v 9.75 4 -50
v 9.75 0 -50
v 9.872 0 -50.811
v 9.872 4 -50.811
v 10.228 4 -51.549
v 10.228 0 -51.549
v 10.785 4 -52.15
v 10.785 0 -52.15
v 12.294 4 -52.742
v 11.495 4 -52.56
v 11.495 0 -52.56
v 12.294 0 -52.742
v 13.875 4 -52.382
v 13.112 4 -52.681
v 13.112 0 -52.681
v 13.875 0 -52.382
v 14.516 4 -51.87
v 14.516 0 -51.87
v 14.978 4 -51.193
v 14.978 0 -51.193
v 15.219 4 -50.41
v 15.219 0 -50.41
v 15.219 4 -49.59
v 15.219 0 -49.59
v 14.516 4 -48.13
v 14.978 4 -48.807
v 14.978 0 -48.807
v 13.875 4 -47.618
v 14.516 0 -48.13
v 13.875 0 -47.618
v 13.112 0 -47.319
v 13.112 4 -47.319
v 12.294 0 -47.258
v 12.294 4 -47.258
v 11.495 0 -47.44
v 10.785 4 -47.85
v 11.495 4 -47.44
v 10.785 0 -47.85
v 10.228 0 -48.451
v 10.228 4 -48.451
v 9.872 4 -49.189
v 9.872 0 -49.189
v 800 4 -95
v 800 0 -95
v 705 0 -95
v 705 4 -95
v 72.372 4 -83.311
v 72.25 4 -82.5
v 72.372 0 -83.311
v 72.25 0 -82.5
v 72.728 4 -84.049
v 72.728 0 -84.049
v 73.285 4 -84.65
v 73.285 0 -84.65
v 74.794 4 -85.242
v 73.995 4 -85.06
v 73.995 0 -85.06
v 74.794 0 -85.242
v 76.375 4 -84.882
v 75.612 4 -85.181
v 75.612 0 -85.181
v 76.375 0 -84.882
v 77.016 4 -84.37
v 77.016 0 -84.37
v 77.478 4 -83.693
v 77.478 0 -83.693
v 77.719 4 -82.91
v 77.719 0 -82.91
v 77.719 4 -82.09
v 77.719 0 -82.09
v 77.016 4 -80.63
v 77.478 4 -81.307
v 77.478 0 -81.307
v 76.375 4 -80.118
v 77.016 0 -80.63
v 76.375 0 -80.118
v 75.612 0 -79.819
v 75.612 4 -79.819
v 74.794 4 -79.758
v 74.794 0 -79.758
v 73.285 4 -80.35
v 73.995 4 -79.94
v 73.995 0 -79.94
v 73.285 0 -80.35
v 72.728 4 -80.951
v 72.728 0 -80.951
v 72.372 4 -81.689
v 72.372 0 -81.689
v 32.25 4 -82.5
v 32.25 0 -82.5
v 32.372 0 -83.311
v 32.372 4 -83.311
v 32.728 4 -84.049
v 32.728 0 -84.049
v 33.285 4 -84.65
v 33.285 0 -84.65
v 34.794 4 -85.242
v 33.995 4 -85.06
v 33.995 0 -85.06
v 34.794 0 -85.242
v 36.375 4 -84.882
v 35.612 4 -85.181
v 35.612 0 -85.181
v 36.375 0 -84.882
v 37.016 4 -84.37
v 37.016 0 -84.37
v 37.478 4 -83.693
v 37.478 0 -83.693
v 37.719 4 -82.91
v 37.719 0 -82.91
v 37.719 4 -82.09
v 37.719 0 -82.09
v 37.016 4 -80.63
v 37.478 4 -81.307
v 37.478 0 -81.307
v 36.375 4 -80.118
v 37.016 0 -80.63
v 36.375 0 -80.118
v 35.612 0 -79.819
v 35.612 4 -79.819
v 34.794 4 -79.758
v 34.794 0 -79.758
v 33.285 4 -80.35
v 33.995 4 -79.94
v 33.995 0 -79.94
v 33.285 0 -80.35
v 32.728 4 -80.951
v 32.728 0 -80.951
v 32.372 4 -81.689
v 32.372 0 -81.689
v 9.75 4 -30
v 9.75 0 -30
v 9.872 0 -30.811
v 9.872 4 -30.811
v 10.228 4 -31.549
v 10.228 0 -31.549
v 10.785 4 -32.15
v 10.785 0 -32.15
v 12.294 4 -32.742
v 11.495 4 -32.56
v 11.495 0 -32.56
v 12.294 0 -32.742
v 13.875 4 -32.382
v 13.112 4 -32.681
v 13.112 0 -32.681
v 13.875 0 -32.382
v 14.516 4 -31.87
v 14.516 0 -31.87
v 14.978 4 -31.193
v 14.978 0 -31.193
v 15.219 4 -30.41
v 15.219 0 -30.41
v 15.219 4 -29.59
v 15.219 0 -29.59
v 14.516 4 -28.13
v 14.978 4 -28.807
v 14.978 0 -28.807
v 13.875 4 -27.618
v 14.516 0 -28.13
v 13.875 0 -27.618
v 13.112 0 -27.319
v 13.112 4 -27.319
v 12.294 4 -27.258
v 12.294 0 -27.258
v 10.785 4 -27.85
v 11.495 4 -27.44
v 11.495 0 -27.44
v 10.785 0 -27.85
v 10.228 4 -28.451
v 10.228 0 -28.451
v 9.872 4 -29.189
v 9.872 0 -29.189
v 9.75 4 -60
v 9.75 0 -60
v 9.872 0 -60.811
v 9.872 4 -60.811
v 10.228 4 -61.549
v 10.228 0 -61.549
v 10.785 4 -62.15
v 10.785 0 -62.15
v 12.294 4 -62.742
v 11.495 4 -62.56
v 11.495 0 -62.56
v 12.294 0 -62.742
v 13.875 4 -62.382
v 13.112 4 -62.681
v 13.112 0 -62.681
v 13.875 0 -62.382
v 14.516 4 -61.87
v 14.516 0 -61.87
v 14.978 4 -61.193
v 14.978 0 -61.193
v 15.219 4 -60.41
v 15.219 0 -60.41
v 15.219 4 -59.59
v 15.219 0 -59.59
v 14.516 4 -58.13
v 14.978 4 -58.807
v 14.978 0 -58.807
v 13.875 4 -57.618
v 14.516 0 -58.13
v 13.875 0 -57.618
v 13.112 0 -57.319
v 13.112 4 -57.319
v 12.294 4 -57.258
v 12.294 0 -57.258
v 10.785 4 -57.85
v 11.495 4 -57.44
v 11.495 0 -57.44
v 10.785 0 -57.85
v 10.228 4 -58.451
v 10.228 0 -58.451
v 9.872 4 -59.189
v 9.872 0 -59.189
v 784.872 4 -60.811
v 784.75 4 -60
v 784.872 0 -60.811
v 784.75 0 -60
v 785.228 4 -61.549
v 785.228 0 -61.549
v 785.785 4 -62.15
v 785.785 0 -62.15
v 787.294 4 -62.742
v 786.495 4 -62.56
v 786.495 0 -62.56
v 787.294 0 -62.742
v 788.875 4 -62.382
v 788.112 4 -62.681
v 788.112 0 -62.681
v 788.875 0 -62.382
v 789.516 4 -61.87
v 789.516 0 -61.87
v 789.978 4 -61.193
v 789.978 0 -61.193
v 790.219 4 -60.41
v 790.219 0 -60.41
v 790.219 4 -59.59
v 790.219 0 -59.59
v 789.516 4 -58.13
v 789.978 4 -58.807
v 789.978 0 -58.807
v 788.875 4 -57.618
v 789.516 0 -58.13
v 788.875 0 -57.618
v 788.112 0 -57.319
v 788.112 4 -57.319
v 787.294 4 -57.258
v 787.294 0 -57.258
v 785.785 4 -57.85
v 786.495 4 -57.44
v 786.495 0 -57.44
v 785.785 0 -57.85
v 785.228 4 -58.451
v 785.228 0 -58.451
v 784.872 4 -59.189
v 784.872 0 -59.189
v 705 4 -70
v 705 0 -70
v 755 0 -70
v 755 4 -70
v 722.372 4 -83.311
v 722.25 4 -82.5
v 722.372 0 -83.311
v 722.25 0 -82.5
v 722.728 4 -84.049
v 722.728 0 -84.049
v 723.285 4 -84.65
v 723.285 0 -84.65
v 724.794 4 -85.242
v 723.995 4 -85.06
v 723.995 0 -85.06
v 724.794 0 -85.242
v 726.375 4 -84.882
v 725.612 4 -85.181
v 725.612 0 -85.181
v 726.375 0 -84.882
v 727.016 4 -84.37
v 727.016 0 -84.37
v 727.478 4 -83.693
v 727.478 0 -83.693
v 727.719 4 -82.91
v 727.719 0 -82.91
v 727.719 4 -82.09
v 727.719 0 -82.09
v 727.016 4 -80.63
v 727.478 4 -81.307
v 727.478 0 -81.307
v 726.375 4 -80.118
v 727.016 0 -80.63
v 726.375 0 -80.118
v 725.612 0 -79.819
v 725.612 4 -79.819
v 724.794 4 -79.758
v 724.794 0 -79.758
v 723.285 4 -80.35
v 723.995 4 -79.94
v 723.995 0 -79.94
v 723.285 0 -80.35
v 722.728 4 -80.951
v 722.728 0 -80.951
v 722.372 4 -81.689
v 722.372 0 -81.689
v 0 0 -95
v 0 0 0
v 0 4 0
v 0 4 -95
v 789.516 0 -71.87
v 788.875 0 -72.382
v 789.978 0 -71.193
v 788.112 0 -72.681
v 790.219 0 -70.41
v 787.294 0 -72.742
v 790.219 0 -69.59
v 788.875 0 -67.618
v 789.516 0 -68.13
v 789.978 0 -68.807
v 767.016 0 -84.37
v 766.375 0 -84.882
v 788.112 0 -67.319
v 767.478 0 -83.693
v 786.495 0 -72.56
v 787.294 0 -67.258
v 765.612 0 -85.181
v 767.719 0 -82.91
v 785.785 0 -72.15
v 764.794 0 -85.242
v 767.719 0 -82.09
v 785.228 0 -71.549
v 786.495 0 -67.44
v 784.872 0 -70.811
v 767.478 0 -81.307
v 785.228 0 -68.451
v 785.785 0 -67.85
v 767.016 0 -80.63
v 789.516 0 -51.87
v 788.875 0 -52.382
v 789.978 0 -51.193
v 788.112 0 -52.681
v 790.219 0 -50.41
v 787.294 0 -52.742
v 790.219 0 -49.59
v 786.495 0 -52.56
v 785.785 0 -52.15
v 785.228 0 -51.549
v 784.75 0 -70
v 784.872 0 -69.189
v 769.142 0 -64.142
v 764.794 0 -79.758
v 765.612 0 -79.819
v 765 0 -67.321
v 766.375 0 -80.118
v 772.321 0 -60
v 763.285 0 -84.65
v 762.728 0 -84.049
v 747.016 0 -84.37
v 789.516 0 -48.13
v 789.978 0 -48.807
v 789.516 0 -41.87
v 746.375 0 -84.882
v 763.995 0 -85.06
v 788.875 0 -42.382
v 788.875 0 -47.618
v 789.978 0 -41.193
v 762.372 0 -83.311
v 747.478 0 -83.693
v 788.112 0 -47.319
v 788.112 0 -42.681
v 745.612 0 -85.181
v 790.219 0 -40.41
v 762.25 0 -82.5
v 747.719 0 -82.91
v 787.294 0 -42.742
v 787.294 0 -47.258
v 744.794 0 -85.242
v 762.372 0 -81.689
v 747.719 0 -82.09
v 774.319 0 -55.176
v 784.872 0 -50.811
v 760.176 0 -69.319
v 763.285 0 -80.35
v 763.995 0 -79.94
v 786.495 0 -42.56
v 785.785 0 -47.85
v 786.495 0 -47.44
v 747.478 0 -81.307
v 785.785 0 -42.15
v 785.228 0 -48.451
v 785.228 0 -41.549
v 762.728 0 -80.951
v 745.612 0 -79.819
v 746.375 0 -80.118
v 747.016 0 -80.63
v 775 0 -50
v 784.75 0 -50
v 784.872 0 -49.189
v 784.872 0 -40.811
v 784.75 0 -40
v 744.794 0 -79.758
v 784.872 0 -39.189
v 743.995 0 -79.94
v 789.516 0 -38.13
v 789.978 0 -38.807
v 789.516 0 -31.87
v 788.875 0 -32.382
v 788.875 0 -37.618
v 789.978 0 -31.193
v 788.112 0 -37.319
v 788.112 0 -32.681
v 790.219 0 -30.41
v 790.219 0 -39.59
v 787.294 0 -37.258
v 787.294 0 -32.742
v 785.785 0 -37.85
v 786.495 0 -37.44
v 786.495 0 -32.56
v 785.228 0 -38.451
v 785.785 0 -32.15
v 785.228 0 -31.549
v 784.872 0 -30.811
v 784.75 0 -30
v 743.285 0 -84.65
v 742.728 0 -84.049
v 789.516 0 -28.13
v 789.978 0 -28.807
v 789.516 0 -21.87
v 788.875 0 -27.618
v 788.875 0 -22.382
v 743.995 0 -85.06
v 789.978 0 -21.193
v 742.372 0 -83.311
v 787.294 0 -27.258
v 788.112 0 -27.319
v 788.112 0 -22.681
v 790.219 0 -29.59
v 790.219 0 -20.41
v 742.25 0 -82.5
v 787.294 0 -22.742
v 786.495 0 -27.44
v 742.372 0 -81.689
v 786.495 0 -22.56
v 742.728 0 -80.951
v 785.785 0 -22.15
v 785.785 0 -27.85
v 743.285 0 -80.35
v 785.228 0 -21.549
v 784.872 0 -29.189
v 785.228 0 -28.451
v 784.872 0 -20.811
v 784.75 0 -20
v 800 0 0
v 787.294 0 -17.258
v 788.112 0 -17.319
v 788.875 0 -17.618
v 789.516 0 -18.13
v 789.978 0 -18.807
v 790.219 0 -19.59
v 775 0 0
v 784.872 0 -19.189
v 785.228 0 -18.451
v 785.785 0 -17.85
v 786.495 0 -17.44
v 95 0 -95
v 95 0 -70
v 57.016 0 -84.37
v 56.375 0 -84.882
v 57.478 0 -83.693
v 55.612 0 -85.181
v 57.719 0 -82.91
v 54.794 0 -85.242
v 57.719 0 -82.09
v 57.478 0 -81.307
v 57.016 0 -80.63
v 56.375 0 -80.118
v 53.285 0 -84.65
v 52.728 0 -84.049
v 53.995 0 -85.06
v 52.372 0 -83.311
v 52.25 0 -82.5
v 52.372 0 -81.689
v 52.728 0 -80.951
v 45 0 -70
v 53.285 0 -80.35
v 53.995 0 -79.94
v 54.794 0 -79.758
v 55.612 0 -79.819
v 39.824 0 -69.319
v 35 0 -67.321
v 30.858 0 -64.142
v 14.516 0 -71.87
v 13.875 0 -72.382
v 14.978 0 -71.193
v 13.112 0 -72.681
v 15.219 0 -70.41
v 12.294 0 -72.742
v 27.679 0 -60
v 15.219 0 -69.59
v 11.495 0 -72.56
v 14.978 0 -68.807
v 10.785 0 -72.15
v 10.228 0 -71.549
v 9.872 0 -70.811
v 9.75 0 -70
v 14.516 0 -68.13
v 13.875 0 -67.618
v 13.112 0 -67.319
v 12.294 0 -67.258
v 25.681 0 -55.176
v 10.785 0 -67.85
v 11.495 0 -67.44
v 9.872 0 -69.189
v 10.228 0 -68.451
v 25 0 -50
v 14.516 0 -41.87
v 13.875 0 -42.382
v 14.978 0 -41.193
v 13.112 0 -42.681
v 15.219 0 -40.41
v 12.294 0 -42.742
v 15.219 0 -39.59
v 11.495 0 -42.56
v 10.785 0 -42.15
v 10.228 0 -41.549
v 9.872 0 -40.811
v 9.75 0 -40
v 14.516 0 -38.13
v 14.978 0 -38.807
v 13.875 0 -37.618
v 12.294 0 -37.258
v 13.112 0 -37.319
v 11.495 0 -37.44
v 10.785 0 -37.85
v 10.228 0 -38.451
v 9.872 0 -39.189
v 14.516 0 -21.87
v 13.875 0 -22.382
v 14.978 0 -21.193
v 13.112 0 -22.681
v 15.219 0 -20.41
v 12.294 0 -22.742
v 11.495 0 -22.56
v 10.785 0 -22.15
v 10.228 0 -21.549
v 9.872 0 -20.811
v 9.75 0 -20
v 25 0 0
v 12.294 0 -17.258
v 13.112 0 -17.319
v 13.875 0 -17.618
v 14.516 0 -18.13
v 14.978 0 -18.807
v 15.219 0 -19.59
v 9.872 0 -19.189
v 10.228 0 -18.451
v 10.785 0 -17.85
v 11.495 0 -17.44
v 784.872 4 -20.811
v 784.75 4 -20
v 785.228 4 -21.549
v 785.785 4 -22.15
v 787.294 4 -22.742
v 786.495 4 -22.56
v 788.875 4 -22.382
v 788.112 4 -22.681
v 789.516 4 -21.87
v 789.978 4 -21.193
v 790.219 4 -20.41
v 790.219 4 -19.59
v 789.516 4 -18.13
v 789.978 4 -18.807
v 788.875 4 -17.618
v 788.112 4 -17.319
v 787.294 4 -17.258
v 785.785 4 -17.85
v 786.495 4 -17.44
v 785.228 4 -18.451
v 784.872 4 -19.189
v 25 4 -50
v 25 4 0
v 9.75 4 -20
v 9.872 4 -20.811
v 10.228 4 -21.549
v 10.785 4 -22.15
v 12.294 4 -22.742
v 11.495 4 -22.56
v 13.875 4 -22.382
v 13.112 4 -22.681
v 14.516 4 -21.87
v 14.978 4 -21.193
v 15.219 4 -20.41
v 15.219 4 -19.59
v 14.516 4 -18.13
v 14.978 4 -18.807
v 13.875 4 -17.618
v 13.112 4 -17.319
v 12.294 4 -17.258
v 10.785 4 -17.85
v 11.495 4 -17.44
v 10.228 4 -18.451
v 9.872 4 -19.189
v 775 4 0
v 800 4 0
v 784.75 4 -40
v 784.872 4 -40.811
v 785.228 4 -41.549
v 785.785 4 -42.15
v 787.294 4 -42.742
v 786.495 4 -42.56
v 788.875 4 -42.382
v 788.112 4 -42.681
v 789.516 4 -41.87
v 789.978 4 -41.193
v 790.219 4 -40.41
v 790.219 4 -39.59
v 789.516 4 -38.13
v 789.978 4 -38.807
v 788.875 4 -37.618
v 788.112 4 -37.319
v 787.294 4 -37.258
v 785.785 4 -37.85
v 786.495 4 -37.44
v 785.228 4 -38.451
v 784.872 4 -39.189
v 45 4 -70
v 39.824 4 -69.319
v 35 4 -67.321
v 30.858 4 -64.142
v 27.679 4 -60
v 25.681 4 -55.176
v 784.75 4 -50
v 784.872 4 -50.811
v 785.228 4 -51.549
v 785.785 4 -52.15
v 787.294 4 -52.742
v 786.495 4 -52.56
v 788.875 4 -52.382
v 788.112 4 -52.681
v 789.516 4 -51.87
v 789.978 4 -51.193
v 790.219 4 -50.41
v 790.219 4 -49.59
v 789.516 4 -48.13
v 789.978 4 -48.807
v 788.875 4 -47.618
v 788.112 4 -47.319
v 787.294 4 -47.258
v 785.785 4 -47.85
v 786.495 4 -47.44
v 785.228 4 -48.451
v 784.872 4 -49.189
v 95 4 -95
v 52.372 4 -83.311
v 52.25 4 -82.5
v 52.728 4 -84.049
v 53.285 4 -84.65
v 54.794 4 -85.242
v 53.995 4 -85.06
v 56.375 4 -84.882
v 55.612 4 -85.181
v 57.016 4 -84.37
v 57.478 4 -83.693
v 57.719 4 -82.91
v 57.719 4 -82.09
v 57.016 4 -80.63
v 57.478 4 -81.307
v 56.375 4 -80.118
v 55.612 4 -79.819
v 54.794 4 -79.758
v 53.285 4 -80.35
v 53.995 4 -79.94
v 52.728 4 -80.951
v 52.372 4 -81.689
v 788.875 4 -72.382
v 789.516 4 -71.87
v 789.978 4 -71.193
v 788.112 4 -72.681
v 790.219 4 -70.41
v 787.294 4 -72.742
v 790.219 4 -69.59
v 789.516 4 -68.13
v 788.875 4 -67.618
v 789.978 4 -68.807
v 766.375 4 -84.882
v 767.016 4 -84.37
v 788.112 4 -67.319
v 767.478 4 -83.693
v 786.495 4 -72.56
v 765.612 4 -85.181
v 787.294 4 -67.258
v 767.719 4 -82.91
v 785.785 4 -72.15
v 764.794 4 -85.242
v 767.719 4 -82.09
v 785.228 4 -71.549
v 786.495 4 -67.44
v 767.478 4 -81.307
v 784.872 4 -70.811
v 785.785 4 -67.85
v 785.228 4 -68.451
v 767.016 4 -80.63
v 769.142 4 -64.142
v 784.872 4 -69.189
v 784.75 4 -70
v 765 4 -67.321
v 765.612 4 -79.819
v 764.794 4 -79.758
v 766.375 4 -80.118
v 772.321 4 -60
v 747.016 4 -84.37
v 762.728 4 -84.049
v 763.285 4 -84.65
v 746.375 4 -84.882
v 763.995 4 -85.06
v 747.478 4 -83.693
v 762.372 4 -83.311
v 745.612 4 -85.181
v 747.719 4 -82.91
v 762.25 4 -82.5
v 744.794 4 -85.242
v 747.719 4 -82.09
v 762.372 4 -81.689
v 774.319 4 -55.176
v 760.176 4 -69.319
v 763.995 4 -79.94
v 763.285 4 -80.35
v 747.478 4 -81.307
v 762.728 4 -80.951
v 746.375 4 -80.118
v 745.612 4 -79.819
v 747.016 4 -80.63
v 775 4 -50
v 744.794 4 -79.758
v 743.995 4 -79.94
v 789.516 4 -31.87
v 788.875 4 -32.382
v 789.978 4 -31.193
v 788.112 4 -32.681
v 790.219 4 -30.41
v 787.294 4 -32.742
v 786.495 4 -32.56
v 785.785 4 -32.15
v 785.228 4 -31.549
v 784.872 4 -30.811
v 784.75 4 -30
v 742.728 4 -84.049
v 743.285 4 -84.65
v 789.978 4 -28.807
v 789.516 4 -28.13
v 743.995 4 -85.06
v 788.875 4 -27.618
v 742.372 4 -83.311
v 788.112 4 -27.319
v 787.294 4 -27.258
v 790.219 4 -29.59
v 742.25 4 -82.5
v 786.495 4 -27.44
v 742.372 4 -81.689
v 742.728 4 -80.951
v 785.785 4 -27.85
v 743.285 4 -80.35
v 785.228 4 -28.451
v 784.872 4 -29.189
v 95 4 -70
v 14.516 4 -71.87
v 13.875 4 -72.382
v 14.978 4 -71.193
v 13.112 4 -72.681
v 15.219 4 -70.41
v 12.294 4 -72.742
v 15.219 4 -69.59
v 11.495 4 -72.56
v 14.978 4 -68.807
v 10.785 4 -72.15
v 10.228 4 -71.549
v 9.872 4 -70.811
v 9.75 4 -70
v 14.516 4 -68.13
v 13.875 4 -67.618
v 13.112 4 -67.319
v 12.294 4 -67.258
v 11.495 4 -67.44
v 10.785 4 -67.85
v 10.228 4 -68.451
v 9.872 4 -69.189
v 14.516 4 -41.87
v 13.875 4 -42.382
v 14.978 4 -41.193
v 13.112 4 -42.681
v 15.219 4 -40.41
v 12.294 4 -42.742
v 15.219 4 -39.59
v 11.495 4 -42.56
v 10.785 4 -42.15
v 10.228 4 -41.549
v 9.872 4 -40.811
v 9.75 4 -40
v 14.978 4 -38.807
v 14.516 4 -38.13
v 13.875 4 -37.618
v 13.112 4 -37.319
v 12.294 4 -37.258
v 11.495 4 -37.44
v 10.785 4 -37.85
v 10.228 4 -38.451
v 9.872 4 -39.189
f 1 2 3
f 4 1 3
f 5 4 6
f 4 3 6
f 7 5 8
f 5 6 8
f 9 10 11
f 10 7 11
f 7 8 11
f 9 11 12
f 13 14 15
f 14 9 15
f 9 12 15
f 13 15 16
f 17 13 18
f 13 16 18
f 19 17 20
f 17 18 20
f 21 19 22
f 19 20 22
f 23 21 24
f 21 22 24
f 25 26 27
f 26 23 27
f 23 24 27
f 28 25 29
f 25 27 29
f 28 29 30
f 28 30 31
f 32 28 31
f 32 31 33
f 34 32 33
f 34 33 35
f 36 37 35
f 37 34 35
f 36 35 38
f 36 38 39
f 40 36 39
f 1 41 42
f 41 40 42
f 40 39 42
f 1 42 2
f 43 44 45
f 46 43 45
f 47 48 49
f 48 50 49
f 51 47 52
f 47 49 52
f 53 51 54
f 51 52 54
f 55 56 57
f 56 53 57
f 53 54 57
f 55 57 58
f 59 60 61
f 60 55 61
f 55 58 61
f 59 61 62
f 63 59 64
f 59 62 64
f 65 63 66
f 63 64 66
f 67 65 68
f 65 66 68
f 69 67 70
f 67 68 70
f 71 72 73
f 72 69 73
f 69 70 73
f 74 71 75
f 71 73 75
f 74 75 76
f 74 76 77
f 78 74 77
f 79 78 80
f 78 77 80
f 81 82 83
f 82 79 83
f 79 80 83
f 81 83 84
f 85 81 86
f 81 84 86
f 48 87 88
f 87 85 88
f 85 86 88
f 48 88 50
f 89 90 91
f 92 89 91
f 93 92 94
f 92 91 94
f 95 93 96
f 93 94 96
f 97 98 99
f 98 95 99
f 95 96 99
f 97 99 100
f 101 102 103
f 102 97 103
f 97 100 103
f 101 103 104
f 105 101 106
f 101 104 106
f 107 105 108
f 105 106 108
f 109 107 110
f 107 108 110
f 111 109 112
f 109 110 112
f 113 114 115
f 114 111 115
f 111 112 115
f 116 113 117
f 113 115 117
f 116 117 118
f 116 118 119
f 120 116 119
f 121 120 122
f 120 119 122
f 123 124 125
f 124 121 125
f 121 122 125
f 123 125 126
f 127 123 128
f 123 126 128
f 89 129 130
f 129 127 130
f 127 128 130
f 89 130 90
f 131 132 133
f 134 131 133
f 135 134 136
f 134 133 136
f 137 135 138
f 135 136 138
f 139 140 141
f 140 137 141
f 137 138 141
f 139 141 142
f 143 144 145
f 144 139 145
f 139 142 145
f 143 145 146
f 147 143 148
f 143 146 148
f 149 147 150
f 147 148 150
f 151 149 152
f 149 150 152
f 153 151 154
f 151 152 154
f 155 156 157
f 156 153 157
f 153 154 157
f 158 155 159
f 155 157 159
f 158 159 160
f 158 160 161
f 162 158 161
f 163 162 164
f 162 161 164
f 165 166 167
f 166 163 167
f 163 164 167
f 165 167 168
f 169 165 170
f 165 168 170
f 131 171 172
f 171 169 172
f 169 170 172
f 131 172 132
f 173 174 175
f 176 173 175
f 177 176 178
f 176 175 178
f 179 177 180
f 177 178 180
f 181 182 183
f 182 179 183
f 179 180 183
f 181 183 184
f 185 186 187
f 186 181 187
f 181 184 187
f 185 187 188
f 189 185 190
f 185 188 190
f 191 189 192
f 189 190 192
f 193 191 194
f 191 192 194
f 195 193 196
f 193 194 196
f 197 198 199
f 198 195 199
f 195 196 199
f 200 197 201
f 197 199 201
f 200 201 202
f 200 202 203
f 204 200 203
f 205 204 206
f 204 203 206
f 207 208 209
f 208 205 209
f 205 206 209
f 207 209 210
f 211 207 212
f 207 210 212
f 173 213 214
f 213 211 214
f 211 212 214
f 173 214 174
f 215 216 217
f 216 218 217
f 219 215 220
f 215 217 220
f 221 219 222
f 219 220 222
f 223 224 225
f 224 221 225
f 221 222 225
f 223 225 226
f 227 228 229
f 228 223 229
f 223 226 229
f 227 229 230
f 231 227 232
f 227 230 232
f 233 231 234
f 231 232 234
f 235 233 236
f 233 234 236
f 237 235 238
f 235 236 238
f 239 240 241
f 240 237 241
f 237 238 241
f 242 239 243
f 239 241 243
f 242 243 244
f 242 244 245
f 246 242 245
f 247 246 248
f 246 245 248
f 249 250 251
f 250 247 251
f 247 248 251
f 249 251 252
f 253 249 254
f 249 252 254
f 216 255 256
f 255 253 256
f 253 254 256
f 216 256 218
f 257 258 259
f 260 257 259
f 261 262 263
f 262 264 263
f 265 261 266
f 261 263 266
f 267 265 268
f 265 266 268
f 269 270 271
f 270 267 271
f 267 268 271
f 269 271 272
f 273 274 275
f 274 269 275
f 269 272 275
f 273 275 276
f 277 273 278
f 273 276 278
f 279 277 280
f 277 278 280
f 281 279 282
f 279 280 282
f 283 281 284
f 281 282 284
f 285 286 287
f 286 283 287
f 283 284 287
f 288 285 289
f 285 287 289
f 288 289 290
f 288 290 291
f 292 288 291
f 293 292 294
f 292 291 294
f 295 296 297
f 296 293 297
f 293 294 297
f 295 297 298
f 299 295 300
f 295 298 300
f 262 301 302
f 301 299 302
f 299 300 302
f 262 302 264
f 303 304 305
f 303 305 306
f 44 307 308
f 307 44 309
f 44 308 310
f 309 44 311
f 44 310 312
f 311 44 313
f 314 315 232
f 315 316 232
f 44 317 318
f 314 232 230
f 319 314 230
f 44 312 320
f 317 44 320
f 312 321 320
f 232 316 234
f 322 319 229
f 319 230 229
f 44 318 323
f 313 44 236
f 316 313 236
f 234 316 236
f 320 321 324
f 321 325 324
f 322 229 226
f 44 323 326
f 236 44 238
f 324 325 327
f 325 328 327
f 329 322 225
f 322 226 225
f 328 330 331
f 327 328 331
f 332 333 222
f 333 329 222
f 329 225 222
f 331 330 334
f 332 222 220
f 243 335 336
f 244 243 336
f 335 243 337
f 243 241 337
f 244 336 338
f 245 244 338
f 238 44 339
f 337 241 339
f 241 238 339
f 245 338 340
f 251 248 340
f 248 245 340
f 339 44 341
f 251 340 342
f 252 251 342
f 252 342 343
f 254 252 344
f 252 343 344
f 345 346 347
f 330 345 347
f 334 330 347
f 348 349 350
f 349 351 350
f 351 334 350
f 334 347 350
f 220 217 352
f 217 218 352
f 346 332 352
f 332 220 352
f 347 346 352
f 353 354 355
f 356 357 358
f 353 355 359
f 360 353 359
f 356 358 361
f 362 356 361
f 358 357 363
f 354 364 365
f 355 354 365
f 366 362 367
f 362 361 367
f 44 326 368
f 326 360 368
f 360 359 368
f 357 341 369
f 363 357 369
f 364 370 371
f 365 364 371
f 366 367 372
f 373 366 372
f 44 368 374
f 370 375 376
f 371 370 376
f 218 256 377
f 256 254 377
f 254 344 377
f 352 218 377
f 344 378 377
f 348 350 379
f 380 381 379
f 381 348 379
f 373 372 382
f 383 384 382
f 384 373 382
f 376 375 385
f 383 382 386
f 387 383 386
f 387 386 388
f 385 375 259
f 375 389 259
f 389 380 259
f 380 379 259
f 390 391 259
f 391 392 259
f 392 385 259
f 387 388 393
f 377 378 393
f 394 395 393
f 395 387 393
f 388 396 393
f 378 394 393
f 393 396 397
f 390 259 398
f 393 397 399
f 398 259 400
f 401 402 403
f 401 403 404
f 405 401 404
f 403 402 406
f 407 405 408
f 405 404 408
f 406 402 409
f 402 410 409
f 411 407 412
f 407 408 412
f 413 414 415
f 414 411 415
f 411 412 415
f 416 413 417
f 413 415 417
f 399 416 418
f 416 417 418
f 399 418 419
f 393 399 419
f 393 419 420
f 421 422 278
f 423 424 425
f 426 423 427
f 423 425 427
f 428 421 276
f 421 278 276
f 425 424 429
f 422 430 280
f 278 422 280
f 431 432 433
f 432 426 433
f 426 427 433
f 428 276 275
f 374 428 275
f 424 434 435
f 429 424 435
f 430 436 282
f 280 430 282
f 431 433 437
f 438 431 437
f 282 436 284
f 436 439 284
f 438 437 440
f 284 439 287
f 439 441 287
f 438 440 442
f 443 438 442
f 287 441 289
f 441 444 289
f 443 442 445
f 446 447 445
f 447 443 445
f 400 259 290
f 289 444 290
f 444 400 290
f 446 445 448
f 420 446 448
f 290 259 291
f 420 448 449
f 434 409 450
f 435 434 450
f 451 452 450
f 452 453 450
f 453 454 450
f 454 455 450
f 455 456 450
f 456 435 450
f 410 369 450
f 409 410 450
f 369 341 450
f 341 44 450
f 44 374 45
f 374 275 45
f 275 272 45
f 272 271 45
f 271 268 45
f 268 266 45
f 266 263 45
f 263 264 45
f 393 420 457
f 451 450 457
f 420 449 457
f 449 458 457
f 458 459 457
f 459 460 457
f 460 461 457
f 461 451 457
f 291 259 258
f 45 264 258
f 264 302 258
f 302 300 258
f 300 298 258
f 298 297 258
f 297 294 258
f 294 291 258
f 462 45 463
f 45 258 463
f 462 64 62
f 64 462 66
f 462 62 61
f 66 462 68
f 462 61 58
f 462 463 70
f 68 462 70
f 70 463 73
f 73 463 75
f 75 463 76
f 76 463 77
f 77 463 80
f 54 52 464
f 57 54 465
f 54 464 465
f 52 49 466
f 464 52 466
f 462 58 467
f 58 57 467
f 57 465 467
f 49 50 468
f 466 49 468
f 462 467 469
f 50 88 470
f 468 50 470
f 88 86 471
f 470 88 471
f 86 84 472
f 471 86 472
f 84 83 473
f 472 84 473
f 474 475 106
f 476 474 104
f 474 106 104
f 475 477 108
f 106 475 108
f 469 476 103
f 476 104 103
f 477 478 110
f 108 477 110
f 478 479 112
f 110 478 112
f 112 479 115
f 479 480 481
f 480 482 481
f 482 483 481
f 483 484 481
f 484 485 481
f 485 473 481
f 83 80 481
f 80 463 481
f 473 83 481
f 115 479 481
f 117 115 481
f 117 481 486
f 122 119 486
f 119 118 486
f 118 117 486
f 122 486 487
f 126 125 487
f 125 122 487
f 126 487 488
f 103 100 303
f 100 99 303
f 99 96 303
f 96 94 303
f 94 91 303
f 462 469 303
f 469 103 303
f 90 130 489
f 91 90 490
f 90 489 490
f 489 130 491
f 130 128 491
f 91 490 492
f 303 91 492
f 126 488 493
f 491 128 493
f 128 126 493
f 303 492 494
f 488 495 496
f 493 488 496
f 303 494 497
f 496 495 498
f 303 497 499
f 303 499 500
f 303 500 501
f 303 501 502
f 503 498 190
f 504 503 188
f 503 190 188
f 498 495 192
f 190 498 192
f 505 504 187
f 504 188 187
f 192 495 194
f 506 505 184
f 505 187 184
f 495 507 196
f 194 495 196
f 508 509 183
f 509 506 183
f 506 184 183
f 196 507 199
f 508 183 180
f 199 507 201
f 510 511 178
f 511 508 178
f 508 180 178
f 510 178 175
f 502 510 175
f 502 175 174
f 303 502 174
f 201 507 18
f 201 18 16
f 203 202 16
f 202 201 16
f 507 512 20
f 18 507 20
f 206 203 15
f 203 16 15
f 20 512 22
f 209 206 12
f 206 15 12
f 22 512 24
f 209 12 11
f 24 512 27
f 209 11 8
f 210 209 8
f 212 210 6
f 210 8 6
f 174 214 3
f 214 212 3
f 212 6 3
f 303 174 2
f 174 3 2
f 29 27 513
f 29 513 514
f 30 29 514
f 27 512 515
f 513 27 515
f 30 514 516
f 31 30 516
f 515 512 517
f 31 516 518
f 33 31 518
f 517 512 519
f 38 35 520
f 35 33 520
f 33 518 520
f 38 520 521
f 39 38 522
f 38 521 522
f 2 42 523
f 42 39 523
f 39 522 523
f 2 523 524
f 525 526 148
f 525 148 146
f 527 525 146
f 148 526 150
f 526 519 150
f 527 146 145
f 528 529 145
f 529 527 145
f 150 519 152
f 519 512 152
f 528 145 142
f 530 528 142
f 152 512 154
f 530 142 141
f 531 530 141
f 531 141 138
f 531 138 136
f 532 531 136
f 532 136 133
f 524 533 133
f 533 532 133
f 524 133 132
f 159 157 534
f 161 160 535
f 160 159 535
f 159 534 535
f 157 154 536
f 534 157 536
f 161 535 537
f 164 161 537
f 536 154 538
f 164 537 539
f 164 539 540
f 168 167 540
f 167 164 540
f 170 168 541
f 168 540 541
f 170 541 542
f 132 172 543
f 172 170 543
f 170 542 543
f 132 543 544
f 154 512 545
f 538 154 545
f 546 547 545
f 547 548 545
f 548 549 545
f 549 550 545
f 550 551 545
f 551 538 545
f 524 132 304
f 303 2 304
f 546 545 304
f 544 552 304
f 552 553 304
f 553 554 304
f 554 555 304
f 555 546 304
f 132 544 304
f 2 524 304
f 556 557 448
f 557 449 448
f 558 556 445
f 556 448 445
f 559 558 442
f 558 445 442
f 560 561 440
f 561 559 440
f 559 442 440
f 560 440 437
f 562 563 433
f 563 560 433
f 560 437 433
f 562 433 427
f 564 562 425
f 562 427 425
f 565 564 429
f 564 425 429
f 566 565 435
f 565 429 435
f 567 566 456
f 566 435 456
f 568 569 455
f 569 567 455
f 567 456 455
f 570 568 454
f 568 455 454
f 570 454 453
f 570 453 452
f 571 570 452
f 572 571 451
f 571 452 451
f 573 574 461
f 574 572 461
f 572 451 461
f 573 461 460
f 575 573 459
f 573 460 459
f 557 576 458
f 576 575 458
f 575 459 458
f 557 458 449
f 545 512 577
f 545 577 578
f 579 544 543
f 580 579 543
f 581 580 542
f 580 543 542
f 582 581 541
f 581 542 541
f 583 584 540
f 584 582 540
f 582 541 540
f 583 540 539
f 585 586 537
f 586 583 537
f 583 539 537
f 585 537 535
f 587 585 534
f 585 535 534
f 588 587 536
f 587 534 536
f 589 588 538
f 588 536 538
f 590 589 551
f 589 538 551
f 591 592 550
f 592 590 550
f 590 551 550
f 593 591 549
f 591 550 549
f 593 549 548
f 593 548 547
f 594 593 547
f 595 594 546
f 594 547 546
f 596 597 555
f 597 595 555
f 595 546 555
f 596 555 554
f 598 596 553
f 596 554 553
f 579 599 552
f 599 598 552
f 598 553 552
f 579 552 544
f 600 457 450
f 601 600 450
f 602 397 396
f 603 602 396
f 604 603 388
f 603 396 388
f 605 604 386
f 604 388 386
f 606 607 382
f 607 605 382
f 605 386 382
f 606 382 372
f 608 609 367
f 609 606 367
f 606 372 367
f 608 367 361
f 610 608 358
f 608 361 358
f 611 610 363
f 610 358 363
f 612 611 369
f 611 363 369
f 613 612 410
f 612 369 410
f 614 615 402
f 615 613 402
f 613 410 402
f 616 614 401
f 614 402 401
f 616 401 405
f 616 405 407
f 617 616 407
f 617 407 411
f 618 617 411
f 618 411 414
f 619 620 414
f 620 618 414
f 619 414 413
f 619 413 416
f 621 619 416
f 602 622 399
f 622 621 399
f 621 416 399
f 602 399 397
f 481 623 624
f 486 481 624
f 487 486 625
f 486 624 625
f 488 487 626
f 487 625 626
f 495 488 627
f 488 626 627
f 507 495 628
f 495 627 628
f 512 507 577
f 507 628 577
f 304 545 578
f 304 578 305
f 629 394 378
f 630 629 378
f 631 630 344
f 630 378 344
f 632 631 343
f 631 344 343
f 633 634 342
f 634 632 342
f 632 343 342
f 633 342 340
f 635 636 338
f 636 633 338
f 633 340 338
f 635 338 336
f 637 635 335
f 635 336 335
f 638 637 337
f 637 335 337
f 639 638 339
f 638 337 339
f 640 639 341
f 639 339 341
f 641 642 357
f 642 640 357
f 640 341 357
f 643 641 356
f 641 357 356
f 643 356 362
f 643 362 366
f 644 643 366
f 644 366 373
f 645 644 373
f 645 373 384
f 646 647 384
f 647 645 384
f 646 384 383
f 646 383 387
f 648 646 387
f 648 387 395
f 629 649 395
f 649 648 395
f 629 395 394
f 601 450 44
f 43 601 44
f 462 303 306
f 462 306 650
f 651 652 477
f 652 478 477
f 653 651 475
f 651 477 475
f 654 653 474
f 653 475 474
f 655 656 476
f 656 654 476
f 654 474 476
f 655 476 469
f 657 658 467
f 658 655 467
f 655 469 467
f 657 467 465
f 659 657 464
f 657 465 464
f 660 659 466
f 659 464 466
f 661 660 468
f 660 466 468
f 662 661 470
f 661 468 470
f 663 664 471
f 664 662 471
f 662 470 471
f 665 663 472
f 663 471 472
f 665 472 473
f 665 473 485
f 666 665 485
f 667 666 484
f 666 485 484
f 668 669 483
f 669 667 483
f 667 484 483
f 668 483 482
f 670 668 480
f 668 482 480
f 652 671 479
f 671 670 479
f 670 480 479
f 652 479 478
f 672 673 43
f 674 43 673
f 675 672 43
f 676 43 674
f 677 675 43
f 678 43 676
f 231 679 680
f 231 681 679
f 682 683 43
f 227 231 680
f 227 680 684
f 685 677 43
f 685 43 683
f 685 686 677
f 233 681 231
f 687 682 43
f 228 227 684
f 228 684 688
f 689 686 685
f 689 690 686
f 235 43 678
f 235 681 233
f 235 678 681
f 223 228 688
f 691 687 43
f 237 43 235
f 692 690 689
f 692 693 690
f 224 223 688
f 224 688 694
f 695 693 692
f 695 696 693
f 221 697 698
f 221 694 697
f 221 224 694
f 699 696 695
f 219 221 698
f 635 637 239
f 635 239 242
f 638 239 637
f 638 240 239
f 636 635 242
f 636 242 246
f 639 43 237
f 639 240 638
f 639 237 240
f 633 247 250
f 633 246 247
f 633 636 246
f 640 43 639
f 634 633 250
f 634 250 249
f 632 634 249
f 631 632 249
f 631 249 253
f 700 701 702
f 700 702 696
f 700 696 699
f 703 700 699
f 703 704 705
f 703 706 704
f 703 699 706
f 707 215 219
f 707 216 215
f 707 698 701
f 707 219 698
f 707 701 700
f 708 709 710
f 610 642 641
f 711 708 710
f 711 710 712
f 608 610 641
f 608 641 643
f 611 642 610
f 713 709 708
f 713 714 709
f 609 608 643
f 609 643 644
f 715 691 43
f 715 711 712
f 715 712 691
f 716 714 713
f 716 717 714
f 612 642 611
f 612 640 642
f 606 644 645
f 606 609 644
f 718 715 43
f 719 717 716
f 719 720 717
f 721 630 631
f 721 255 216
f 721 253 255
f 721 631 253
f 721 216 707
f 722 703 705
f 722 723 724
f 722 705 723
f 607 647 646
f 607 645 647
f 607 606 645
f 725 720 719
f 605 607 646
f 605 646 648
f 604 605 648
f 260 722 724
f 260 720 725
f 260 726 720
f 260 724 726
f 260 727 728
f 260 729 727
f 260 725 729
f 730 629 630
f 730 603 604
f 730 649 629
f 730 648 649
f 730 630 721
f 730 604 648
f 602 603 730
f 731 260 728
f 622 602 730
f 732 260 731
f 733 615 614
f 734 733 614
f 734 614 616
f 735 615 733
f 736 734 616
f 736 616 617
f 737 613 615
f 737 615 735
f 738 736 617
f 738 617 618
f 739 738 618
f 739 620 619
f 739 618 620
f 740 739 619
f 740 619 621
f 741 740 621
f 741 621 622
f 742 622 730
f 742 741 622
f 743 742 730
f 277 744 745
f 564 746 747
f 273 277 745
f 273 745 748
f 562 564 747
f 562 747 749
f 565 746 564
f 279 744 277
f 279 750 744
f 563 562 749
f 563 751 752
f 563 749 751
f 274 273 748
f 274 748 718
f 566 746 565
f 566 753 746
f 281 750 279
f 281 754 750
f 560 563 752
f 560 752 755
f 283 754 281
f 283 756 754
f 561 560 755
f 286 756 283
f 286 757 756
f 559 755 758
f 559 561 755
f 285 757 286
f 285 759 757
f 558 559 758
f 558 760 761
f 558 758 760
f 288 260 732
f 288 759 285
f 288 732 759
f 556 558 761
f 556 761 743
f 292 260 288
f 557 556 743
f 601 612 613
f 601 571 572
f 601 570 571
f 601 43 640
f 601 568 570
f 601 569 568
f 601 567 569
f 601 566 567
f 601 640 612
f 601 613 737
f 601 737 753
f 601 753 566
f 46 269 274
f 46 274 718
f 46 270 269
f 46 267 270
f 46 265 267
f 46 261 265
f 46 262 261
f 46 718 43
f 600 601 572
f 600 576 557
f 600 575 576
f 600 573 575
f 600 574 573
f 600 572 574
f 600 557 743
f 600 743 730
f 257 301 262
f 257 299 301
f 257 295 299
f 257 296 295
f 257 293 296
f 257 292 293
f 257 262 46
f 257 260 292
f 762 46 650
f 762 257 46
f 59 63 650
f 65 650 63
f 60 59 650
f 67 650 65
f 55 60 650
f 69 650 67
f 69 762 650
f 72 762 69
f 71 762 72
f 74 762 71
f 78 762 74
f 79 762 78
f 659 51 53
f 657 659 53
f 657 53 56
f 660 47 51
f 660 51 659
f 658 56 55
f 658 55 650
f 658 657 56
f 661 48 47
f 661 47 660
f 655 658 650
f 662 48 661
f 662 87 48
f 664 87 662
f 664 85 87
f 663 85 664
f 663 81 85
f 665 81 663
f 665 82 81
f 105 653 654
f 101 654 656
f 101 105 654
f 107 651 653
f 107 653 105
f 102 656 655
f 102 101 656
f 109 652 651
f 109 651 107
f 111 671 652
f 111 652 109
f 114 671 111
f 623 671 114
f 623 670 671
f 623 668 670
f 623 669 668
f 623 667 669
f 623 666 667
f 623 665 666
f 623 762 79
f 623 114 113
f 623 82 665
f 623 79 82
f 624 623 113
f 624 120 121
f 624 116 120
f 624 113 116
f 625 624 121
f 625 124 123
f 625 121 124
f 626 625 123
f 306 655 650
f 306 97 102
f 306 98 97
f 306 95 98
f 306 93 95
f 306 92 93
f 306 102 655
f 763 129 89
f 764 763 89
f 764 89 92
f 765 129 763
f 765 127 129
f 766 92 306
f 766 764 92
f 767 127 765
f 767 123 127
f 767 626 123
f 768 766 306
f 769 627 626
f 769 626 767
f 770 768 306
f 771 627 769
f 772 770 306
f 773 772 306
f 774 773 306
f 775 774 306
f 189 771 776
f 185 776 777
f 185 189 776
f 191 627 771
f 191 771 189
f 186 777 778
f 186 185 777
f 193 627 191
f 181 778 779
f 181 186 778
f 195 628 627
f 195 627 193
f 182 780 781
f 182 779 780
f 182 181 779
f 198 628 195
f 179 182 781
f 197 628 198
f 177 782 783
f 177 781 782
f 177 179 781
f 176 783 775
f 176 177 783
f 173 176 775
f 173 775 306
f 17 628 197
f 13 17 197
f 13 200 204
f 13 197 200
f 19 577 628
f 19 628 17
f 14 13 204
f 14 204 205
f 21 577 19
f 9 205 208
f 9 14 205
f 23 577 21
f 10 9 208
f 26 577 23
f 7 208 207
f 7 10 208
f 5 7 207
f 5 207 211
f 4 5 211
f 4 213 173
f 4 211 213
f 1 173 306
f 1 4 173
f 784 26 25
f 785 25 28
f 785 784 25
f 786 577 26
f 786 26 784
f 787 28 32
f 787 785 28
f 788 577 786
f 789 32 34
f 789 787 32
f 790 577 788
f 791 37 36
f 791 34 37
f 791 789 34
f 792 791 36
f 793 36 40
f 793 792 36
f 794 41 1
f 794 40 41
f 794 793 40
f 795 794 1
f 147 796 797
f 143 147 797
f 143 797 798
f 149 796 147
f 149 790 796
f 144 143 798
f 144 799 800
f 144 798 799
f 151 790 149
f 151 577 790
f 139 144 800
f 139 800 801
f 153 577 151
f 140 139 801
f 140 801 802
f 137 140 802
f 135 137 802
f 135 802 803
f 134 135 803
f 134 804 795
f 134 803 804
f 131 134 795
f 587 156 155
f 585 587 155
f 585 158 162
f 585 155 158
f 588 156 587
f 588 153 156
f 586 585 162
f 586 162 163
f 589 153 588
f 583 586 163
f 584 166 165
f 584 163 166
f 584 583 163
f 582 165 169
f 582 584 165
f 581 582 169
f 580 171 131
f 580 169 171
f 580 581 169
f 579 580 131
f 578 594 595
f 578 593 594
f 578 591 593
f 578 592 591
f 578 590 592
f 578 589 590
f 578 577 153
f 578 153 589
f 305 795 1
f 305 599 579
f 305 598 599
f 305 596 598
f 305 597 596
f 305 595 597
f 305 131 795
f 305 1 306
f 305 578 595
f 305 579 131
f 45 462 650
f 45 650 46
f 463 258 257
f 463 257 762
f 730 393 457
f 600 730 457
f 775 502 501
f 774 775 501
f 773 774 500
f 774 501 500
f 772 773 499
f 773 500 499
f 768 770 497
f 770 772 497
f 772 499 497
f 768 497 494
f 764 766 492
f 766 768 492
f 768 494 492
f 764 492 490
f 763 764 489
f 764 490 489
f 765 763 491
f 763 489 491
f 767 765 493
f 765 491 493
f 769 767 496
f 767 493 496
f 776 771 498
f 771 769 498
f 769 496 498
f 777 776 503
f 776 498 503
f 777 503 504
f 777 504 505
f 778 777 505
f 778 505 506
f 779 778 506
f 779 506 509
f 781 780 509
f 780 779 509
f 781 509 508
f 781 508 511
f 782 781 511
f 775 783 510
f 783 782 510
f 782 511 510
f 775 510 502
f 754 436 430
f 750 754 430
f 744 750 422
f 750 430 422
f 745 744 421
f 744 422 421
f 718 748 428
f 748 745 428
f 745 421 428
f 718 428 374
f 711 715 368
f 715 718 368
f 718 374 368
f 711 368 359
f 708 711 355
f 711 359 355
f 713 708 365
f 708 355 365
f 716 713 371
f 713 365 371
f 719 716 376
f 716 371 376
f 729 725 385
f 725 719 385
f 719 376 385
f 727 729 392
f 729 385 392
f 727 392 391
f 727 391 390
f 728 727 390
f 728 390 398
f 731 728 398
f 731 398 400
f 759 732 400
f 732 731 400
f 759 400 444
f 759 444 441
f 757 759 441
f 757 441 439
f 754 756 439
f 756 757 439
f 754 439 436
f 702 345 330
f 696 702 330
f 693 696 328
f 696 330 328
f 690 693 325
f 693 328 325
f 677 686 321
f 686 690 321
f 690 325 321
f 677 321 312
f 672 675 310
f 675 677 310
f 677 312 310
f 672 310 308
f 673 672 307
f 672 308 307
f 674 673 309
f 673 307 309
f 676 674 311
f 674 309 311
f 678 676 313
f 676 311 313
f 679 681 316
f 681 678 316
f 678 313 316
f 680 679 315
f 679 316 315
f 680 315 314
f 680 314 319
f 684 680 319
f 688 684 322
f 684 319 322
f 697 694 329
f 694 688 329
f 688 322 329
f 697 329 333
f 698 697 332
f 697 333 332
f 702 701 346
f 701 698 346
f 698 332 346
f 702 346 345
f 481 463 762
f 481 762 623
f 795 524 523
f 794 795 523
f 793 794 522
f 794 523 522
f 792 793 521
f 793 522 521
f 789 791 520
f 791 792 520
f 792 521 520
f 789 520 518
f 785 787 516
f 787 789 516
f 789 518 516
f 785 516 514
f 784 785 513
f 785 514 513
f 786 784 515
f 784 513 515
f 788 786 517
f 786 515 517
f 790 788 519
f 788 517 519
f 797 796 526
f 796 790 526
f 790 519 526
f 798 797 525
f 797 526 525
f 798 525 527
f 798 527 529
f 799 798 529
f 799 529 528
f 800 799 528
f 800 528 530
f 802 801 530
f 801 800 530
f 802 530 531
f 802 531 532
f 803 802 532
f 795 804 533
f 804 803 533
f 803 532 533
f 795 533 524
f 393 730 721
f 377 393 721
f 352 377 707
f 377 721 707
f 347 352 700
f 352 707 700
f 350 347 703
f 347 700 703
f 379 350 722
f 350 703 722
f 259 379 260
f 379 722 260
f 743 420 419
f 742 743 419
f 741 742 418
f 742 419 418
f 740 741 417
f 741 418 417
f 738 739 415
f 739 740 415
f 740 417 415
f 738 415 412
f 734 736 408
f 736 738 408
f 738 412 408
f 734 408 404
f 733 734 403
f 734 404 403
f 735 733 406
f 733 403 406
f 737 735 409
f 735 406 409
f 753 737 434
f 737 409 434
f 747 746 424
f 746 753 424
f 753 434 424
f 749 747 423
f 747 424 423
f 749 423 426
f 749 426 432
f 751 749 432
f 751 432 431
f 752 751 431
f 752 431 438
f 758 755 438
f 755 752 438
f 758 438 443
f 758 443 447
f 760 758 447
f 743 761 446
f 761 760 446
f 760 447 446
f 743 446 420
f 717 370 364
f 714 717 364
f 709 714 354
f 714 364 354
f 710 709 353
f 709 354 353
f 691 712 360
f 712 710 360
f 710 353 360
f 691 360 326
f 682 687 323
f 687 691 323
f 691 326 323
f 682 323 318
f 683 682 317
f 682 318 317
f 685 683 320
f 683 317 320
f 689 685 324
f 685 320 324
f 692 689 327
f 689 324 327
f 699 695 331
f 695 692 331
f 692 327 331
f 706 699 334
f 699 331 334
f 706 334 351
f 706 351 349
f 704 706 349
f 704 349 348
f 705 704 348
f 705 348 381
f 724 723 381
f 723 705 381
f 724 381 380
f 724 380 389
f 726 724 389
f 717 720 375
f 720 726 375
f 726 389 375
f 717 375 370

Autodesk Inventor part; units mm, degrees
ref_plane "YZ Plane" through (0, 0, 0) normal (1, 0, 0) x (0, 1, 0)
ref_plane "XZ Plane" through (0, 0, 0) normal (0, 1, 0) x (-1, 0, 0)
ref_plane "XY Plane" through (0, 0, 0) normal (0, 0, 1) x (1, 0, 0)
sketch "Sketch1" plane through (0, 0, 0) normal (0, 1, 0) x (-1, 0, 0)
  line L0 (0, 0) -> (0, -95)
  line L1 (0, -95) -> (-95, -95)
  line L2 (-95, -95) -> (-95, -70) construction
  line L3 (-95, -70) -> (-25, -70)
  line L4 (-25, -70) -> (-25, 0)
  line L5 (-25, 0) -> (0, 0)
  circle A0 centre (-12.5, -20) radius 2.75
  line L6 (-12.5, 0) -> (-12.5, -95) construction
  circle A1 centre (-12.5, -40) radius 2.75
  circle A2 centre (-12.5, -60) radius 2.75
  line L7 (-95, -82.5) -> (0, -82.5) construction
  circle A3 centre (-35, -82.5) radius 2.75
  circle A4 centre (-55, -82.5) radius 2.75
  circle A5 centre (-75, -82.5) radius 2.75
  circle A6 centre (-12.5, -30) radius 2.75
  circle A7 centre (-12.5, -50) radius 2.75
  circle A8 centre (-12.5, -70) radius 2.75
  line L8 (-400, -139.4226) -> (-400, 36.9661) construction
  line L9 (-800, 0) -> (-800, -95)
  line L10 (-800, -95) -> (-705, -95)
  line L11 (-705, -95) -> (-705, -70) construction
  line L12 (-705, -70) -> (-775, -70)
  line L13 (-775, -70) -> (-775, 0)
  line L14 (-775, 0) -> (-800, 0)
  circle A9 centre (-787.5, -20) radius 2.75
  line L15 (-787.5, 0) -> (-787.5, -95) construction
  circle A10 centre (-787.5, -40) radius 2.75
  circle A11 centre (-787.5, -60) radius 2.75
  line L16 (-705, -82.5) -> (-800, -82.5) construction
  circle A12 centre (-765, -82.5) radius 2.75
  circle A13 centre (-745, -82.5) radius 2.75
  circle A14 centre (-725, -82.5) radius 2.75
  circle A15 centre (-787.5, -30) radius 2.75
  circle A16 centre (-787.5, -50) radius 2.75
  circle A17 centre (-787.5, -70) radius 2.75
  line L17 (-95, -95) -> (-705, -95)
  line L18 (-705, -70) -> (-95, -70)
  dimension "d0" = 25
  dimension "d1" = 70
  dimension "d2" = 25
  dimension "d3" = 70
  dimension "d4" = 5.5
  dimension "d5" = 20
  dimension "d6" = 5.5
  dimension "d7" = 5.5
  dimension "d8" = 20
  dimension "d9" = 20
  dimension "d12" = 5.5
  dimension "d13" = 35
  dimension "d14" = 5.5
  dimension "d15" = 20
  dimension "d16" = 5.5
  dimension "d17" = 20
  dimension "d22" = 10
  dimension "d28" = 400
extrude "Extrusion1" add sketch "Sketch1" along normal blind 4
fillet "Fillet1" radius 20 2 edges at (25, 2, -70) (775, 2, -70)
properties part number "Brace 1" material "CFRP"
